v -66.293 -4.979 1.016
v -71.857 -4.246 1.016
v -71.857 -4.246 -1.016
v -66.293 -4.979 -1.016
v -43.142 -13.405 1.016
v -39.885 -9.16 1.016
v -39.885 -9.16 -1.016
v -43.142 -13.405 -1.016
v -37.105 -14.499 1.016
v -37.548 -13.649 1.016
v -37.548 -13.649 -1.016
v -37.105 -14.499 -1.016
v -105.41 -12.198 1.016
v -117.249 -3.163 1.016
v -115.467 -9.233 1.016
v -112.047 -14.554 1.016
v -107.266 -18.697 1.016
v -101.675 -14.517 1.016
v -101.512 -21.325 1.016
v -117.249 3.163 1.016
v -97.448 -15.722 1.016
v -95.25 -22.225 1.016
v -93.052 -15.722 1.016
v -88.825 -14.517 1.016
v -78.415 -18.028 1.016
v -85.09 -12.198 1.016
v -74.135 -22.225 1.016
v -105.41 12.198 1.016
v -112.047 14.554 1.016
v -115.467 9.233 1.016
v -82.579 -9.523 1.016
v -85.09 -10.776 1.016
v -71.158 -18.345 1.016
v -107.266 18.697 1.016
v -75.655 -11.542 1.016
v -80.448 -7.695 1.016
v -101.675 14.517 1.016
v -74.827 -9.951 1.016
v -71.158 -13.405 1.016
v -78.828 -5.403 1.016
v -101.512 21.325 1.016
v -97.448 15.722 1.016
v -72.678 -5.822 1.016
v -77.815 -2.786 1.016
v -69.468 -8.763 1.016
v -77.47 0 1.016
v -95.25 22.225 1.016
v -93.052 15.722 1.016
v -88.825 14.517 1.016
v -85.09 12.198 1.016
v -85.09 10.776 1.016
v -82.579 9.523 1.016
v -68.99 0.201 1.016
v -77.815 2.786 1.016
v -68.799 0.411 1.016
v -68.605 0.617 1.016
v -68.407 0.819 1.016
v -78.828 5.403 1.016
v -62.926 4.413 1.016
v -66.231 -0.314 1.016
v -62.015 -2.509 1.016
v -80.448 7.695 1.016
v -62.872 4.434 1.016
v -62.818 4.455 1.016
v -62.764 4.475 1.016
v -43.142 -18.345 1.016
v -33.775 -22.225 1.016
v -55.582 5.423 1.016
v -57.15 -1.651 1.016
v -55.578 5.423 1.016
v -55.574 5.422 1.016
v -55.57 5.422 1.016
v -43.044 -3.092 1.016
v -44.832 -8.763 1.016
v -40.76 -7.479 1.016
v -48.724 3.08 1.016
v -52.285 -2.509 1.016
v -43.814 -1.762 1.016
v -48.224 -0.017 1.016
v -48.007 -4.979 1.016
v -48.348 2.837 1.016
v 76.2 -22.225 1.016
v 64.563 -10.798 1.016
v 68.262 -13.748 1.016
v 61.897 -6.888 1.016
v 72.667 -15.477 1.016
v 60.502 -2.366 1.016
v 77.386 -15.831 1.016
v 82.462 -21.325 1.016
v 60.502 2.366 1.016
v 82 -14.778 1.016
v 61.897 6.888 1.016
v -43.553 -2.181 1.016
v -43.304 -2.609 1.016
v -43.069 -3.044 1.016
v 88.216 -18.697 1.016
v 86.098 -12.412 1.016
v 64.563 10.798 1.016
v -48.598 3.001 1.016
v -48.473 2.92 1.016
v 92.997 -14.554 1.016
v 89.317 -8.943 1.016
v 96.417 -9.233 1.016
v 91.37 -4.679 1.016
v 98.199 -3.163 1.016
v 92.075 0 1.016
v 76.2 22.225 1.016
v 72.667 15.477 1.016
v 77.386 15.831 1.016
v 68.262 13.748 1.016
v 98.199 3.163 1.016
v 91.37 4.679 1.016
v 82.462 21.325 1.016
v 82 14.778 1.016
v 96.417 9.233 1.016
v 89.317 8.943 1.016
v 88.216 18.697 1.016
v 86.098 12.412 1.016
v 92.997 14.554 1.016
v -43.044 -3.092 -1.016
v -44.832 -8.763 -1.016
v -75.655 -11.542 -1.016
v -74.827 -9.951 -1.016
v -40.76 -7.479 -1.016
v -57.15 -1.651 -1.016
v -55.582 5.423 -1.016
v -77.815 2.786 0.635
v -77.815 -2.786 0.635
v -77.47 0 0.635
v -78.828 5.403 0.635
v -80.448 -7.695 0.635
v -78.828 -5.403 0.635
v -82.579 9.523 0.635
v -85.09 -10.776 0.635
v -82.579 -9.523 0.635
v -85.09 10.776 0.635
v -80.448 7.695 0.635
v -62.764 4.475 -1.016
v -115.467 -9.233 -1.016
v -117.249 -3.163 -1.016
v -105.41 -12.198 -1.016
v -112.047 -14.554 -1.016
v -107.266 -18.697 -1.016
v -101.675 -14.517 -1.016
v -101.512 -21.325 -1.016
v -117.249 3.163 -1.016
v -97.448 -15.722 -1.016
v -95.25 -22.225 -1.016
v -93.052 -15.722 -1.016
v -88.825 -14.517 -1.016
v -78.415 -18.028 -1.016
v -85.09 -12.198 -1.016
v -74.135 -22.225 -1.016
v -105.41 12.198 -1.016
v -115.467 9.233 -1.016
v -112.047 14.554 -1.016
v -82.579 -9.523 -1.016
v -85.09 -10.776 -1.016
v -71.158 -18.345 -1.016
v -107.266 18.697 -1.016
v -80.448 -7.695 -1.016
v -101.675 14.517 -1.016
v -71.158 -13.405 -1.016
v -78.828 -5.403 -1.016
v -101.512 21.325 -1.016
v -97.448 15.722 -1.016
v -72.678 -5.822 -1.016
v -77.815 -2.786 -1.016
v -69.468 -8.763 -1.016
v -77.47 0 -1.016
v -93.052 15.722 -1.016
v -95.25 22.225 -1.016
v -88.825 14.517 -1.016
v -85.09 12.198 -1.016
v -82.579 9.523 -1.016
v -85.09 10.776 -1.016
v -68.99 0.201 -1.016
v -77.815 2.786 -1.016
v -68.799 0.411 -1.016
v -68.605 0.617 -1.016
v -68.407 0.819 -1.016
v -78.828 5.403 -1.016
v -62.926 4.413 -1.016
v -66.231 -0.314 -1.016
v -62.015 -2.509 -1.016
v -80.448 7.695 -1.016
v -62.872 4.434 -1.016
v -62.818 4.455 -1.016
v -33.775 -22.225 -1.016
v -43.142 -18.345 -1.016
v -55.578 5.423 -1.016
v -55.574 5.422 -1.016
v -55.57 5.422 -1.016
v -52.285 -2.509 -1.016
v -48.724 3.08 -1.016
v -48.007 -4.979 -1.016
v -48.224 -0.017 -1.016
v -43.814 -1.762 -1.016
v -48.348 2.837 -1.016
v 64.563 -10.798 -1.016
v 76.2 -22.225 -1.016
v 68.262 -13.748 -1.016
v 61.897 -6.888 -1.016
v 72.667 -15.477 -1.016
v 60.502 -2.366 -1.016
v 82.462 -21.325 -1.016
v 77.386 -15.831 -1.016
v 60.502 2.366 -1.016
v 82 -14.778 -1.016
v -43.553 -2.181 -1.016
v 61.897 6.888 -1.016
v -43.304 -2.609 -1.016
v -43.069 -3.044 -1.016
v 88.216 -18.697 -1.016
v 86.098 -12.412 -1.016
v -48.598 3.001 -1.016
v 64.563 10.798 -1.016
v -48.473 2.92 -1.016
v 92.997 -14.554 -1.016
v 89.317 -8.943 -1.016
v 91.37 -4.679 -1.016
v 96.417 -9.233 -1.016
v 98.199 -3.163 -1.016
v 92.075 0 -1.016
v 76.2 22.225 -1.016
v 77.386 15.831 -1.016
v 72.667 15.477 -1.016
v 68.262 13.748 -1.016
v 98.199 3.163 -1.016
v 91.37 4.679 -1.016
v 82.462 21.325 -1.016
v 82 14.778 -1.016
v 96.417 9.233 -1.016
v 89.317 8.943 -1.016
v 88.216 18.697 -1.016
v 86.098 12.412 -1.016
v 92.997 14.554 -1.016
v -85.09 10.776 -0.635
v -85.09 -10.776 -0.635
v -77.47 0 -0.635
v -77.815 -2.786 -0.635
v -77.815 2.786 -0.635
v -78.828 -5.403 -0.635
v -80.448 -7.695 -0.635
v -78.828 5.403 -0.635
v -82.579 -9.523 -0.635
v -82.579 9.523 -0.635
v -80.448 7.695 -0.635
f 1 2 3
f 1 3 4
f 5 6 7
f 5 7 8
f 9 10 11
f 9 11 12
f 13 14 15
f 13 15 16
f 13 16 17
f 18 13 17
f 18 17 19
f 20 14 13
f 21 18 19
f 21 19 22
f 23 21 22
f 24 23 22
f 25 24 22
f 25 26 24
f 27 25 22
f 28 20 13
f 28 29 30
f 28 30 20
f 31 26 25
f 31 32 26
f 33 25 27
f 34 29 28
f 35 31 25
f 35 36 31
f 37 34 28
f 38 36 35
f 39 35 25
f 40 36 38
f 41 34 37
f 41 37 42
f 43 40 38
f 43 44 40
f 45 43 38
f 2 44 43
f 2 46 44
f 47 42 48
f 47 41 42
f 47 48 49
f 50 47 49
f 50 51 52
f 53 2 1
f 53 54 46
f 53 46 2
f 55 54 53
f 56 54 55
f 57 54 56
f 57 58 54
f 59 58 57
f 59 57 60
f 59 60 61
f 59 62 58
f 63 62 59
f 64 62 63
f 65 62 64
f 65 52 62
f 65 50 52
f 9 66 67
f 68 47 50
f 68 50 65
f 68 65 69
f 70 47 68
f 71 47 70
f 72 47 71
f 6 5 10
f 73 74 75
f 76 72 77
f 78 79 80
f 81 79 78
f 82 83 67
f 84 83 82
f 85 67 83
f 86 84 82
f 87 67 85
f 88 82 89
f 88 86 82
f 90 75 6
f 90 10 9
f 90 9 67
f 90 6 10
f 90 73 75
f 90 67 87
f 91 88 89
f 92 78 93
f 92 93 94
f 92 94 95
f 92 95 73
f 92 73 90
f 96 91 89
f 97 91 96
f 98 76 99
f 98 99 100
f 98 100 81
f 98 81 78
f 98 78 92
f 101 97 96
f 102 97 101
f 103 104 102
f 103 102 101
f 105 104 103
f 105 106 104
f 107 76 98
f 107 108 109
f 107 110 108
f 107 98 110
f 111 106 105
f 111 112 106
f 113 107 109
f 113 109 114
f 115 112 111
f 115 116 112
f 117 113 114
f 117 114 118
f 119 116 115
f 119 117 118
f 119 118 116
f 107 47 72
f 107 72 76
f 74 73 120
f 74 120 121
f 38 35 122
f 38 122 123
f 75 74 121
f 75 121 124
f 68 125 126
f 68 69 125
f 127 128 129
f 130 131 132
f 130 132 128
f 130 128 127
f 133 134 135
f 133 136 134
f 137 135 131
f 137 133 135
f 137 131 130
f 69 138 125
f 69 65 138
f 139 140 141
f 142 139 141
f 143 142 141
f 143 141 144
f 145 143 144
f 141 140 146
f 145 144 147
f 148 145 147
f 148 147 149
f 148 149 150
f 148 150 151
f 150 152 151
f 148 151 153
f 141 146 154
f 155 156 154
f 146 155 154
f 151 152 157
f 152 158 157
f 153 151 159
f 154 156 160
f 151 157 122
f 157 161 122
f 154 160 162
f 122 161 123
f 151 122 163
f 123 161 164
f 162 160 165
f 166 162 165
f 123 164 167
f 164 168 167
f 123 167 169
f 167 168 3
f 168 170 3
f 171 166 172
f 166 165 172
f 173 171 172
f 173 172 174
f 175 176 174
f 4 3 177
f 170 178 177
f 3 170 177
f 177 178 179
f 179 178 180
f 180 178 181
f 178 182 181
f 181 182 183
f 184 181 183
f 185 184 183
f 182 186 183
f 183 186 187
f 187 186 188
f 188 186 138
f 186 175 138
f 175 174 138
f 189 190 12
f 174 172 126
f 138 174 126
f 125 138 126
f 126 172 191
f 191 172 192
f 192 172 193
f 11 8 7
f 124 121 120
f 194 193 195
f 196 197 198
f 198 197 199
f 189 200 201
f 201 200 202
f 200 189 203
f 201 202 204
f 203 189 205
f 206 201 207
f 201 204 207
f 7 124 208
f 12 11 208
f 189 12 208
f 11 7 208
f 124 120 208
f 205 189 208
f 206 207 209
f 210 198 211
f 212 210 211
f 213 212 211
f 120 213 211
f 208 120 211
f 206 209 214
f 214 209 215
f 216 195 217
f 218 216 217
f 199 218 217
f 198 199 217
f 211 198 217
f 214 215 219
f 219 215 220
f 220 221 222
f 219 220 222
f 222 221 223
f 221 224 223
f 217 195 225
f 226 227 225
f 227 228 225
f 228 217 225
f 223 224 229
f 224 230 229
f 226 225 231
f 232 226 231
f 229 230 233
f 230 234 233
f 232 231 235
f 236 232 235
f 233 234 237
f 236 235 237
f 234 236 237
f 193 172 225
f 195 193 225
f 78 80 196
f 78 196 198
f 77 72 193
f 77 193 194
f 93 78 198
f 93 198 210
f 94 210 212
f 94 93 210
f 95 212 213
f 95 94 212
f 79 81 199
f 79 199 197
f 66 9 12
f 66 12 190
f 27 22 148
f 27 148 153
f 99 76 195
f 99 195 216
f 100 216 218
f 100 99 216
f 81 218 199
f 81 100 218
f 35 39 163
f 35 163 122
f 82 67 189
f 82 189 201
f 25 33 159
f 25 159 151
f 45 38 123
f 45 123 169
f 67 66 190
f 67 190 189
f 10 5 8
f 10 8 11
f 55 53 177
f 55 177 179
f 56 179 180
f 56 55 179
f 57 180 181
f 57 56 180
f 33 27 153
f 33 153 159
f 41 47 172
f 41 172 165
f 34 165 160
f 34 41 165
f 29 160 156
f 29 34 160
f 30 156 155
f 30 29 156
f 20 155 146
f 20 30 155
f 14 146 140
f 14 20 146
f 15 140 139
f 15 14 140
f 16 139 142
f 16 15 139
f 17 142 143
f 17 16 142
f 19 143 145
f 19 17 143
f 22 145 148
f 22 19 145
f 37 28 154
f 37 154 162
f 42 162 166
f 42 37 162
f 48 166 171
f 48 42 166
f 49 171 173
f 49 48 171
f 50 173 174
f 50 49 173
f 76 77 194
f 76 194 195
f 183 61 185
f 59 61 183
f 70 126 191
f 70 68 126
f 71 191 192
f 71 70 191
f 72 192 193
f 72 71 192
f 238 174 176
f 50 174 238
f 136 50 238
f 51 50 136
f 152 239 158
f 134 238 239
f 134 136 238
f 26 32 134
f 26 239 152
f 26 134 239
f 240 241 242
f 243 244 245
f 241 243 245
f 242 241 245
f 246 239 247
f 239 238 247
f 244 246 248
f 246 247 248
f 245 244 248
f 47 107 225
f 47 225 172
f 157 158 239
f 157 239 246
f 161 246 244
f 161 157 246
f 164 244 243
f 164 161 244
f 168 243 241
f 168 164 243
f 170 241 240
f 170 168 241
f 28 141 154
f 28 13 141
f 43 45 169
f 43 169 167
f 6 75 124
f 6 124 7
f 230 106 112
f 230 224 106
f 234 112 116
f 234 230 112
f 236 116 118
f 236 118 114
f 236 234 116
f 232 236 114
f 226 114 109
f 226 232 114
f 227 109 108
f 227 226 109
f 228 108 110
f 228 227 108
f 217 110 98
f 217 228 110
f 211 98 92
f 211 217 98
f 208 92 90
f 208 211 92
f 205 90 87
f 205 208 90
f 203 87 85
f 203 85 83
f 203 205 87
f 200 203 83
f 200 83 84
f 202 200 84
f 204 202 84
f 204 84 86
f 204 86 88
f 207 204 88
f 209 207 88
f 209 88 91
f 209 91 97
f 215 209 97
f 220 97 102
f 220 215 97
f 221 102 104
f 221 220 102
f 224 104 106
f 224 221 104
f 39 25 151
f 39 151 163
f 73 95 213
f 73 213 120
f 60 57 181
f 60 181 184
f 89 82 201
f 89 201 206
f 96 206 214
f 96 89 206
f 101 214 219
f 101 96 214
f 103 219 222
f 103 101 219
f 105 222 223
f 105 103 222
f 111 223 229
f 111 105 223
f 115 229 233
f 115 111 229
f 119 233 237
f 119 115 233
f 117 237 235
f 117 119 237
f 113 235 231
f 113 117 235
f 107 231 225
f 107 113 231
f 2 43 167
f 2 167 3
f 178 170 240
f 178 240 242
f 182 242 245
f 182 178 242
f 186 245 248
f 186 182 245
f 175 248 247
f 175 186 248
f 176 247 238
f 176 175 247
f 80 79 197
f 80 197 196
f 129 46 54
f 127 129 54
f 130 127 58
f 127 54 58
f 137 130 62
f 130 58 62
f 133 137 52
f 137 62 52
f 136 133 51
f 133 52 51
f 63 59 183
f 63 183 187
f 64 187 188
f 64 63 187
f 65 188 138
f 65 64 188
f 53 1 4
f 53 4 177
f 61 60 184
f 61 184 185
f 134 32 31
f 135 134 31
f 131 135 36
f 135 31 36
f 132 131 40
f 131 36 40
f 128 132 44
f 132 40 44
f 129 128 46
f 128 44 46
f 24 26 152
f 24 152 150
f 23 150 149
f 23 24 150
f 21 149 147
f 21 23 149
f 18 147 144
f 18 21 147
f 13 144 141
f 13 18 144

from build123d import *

# Parameters (mm, degrees)
F0_R     = 15.875
F1_DEPTH = 1.016
F3_DEPTH = 0.381


# Not quite as in the source:
# - a pattern or mirror of a feature is missing from the dataset's text; its kind, count and spacing are read off the source's solid
# - a feature names something its author has since deleted; it is built from what else it names


with BuildPart() as f1:
    # F0 (on Top) → F1 (new body, symmetric)
    with BuildSketch(Plane.XY):
        with BuildLine():
            Line((76.2, 22.225), (-95.25, 22.225))
            ThreePointArc((-95.25, 22.225), (-117.475, 0), (-95.25, -22.225))
            Line((-95.25, -22.225), (-81.2163393225, -22.225))
            Line((-81.2163393225, -22.225), (-80.4999828905, -20.8488920975))
            Line((-80.4999828905, -20.8488920975), (-81.8859980281, -17.8765730428))
            Line((-81.8859980281, -17.8765730428), (-80.3221061469, -17.944854037))
            Line((-80.3221061469, -17.944854037), (-81.0788131138, -9.2956538274))
            Line((-81.0788131138, -9.2956538274), (-79.6325889287, -9.8946994991))
            Line((-79.6325889287, -9.8946994991), (-77.3854601863, -1.5083008612))
            Line((-77.3854601863, -1.5083008612), (-76.231339678, -2.5658574615))
            Line((-76.231339678, -2.5658574615), (-71.2514121167, 4.5462161589))
            Line((-71.2514121167, 4.5462161589), (-70.5285992516, 3.1577055639))
            Line((-70.5285992516, 3.1577055639), (-63.4165256312, 8.1376331253))
            Line((-63.4165256312, 8.1376331253), (-63.2122023083, 6.5856434055))
            Line((-63.2122023083, 6.5856434055), (-54.8258036704, 8.832772148))
            Line((-54.8258036704, 8.832772148), (-55.1646142981, 7.3044961686))
            Line((-55.1646142981, 7.3044961686), (-46.5154140885, 6.5477892017))
            Line((-46.5154140885, 6.5477892017), (-47.3564931047, 5.2275596009))
            Line((-47.3564931047, 5.2275596009), (-39.4877125173, 1.5582869527))
            Line((-39.4877125173, 1.5582869527), (-40.7296133796, 0.6053429047))
            Line((-40.7296133796, 0.6053429047), (-34.5903434842, -5.5339269908))
            Line((-34.5903434842, -5.5339269908), (-36.0832746201, -6.0046463698))
            Line((-36.0832746201, -6.0046463698), (-32.4140019719, -13.8734269572))
            Line((-32.4140019719, -13.8734269572), (-33.9778938531, -13.805145963))
            Line((-33.9778938531, -13.805145963), (-33.273088024, -21.8611134529))
            Line((-33.273088024, -21.8611134529), (-33.0836606775, -22.225))
            Line((-33.0836606775, -22.225), (76.2, -22.225))
            ThreePointArc((76.2, -22.225), (98.425, 0), (76.2, 22.225))
        make_face()
        with BuildLine():
            ThreePointArc((-105.41, 12.1979516723), (-95.25, 15.875), (-85.09, 12.1979516723))
            Line((-85.09, 12.1979516723), (-85.09, -12.1979516723))
            ThreePointArc((-85.09, -12.1979516723), (-95.25, -15.875), (-105.41, -12.1979516723))
            Line((-105.41, -12.1979516723), (-105.41, 12.1979516723))
        make_face(mode=Mode.SUBTRACT)
        with Locations((76.2, 0)):
            Circle(F0_R, mode=Mode.SUBTRACT)
        Polygon((-80.4999828905, -20.8488920975), (-81.2163393225, -22.225), (-79.8582932371, -22.225), align=None)
        Polygon((-33.2412520763, -22.225), (-33.0836606775, -22.225), (-33.273088024, -21.8611134529), align=None)
        Polygon((-80.4999828905, -20.8488920975), (-79.8582932371, -22.225), (-77.6369016412, -22.225), (-74.1351559236, -22.225), (-71.1579054788, -18.3449716791), (-78.4147248097, -18.0281321046), (-79.3376725148, -18.6161146398), align=None)
        Polygon((-81.8859980281, -17.8765730428), (-80.4999828905, -20.8488920975), (-79.3376725148, -18.6161146398), (-80.2145068425, -19.1747197137), (-80.3221061469, -17.944854037), align=None)
        Polygon((-33.7748775265, -22.225), (-33.2412520763, -22.225), (-33.273088024, -21.8611134529), (-37.1054537581, -14.4992073738), (-43.1420945212, -18.3449716791), align=None)
        Polygon((-37.1054537581, -14.4992073738), (-33.273088024, -21.8611134529), (-33.9778938531, -13.805145963), (-35.8852751903, -13.7218678954), align=None)
        Polygon((-79.0178794125, -18.001797806), (-79.3376725148, -18.6161146398), (-78.4147248097, -18.0281321046), align=None)
        Polygon((-80.2145068425, -19.1747197137), (-79.3376725148, -18.6161146398), (-79.0178794125, -18.001797806), (-80.3221061469, -17.944854037), align=None)
        Polygon((-35.8852751903, -13.7218678954), (-33.9778938531, -13.805145963), (-34.0854931575, -12.5752802863), align=None)
        Polygon((-34.0854931575, -12.5752802863), (-33.9778938531, -13.805145963), (-32.4140019719, -13.8734269572), (-36.0832746201, -6.0046463698), (-37.9041095643, -6.5787534225), (-39.8848289883, -9.1600772324), (-37.5478999587, -13.6492761303), (-35.8852751903, -13.7218678954), align=None)
        Polygon((-37.5478999587, -13.6492761303), (-37.1054537581, -14.4992073738), (-35.8852751903, -13.7218678954), align=None)
        Polygon((-81.0788131138, -9.2956538274), (-80.3221061469, -17.944854037), (-79.0178794125, -18.001797806), (-75.6552159218, -11.5421813412), (-77.8687195378, -10.6253181231), (-79.9521174914, -11.0871963296), (-79.6325889287, -9.8946994991), align=None)
        Polygon((-79.0178794125, -18.001797806), (-78.4147248097, -18.0281321046), (-71.1579054788, -13.4050283209), (-75.6552159218, -11.5421813412), align=None)
        Polygon((-43.1420945212, -13.4050283209), (-37.5478999587, -13.6492761303), (-39.8848289883, -9.1600772324), align=None)
        Polygon((-77.8687195378, -10.6253181231), (-75.6552159218, -11.5421813412), (-74.8268774652, -9.950957971), align=None)
        Polygon((-37.9041095643, -6.5787534225), (-36.0832746201, -6.0046463698), (-36.6050237274, -4.8857517984), align=None)
        Polygon((-36.6050237274, -4.8857517984), (-36.0832746201, -6.0046463698), (-34.5903434842, -5.5339269908), (-40.7296133796, 0.6053429047), (-42.2442823639, -0.5569034849), (-43.0436234519, -3.0920895249), (-40.7598556276, -7.4791666976), (-37.9041095643, -6.5787534225), align=None)
        Polygon((-40.7598556276, -7.4791666976), (-39.8848289883, -9.1600772324), (-37.9041095643, -6.5787534225), align=None)
        Polygon((-77.8687195378, -10.6253181231), (-79.6325889287, -9.8946994991), (-79.9521174914, -11.0871963296), align=None)
        Polygon((-77.3854601863, -1.5083008612), (-79.6325889287, -9.8946994991), (-77.8687195378, -10.6253181231), (-74.8268774652, -9.950957971), (-72.6776090009, -5.822251665), (-74.8237309138, -3.855693253), (-76.9394562474, -3.5771527286), (-76.231339678, -2.5658574615), align=None)
        Polygon((-72.6776090009, -5.822251665), (-74.8268774652, -9.950957971), (-69.4683453434, -8.763), align=None)
        Polygon((-44.8316546566, -8.763), (-40.7598556276, -7.4791666976), (-43.0436234519, -3.0920895249), align=None)
        Polygon((-74.8237309138, -3.855693253), (-72.6776090009, -5.822251665), (-71.8571921171, -4.2462454947), align=None)
        Polygon((-42.2442823639, -0.5569034849), (-40.7296133796, 0.6053429047), (-41.6025816474, 1.4783111724), align=None)
        with BuildLine():
            Line((-41.6025816474, 1.4783111724), (-40.7296133796, 0.6053429047))
            Line((-40.7296133796, 0.6053429047), (-39.4877125173, 1.5582869527))
            Line((-39.4877125173, 1.5582869527), (-47.3564931047, 5.2275596009))
            Line((-47.3564931047, 5.2275596009), (-48.3823046954, 3.617357942))
            Line((-48.3823046954, 3.617357942), (-48.348249672, 2.8373696699))
            ThreePointArc((-48.348249672, 2.8373696699), (-45.8449546627, 0.7708533195), (-43.8143326805, -1.7616454653))
            Line((-43.8143326805, -1.7616454653), (-42.2442823639, -0.5569034849))
            Line((-42.2442823639, -0.5569034849), (-41.6025816474, 1.4783111724))
        make_face()
        with BuildLine():
            Line((-43.0687030233, -3.0439121166), (-43.0436234519, -3.0920895249))
            Line((-43.0436234519, -3.0920895249), (-42.2442823639, -0.5569034849))
            Line((-42.2442823639, -0.5569034849), (-43.8143326805, -1.7616454653))
            ThreePointArc((-43.8143326805, -1.7616454653), (-43.4265334283, -2.3940654467), (-43.0687030233, -3.0439121166))
        make_face()
        Polygon((-74.8237309138, -3.855693253), (-76.231339678, -2.5658574615), (-76.9394562474, -3.5771527286), align=None)
        with BuildLine():
            Line((-71.2514121167, 4.5462161589), (-76.231339678, -2.5658574615))
            Line((-76.231339678, -2.5658574615), (-74.8237309138, -3.855693253))
            Line((-74.8237309138, -3.855693253), (-71.8571921171, -4.2462454947))
            Line((-71.8571921171, -4.2462454947), (-71.2312969767, -3.0439121166))
            ThreePointArc((-71.2312969767, -3.0439121166), (-70.2116133855, -1.3514289323), (-68.9895778341, 0.2012729279))
            Line((-68.9895778341, 0.2012729279), (-69.6470295052, 1.4642258374))
            Line((-69.6470295052, 1.4642258374), (-71.5398945187, 2.4495889946))
            Line((-71.5398945187, 2.4495889946), (-70.5285992516, 3.1577055639))
            Line((-70.5285992516, 3.1577055639), (-71.2514121167, 4.5462161589))
        make_face()
        with BuildLine():
            Line((-71.2312969767, -3.0439121166), (-71.8571921171, -4.2462454947))
            Line((-71.8571921171, -4.2462454947), (-66.2930109602, -4.9787838411))
            Line((-66.2930109602, -4.9787838411), (-68.9895778341, 0.2012729279))
            ThreePointArc((-68.9895778341, 0.2012729279), (-70.2116133855, -1.3514289323), (-71.2312969767, -3.0439121166))
        make_face()
        Polygon((-48.3823046954, 3.617357942), (-47.3564931047, 5.2275596009), (-48.4753876761, 5.7493087082), align=None)
        with BuildLine():
            Line((-48.4753876761, 5.7493087082), (-47.3564931047, 5.2275596009))
            Line((-47.3564931047, 5.2275596009), (-46.5154140885, 6.5477892017))
            Line((-46.5154140885, 6.5477892017), (-55.1646142981, 7.3044961686))
            Line((-55.1646142981, 7.3044961686), (-55.5778404781, 5.4405533245))
            Line((-55.5778404781, 5.4405533245), (-55.5701648333, 5.4220226787))
            ThreePointArc((-55.5701648333, 5.4220226787), (-52.0121003071, 4.6464015983), (-48.7243991788, 3.0803771655))
            Line((-48.7243991788, 3.0803771655), (-48.3823046954, 3.617357942))
            Line((-48.3823046954, 3.617357942), (-48.4753876761, 5.7493087082))
        make_face()
        with BuildLine():
            Line((-48.0069890398, -4.9787838411), (-43.8143326805, -1.7616454653))
            ThreePointArc((-43.8143326805, -1.7616454653), (-45.8449546627, 0.7708533195), (-48.348249672, 2.8373696699))
            Line((-48.348249672, 2.8373696699), (-48.2236044906, -0.017474342))
            Line((-48.2236044906, -0.017474342), (-48.0069890398, -4.9787838411))
        make_face()
        Polygon((-69.6470295052, 1.4642258374), (-70.5285992516, 3.1577055639), (-71.5398945187, 2.4495889946), align=None)
        with BuildLine():
            Line((-63.4165256312, 8.1376331253), (-70.5285992516, 3.1577055639))
            Line((-70.5285992516, 3.1577055639), (-69.6470295052, 1.4642258374))
            Line((-69.6470295052, 1.4642258374), (-68.4074402589, 0.8189365196))
            ThreePointArc((-68.4074402589, 0.8189365196), (-65.8542771411, 2.9017913046), (-62.9261305575, 4.4127127279))
            Line((-62.9261305575, 4.4127127279), (-62.9630019017, 4.6927783921))
            Line((-62.9630019017, 4.6927783921), (-64.4046991388, 6.2661148428))
            Line((-64.4046991388, 6.2661148428), (-63.2122023083, 6.5856434055))
            Line((-63.2122023083, 6.5856434055), (-63.4165256312, 8.1376331253))
        make_face()
        with BuildLine():
            Line((-69.6470295052, 1.4642258374), (-68.9895778341, 0.2012729279))
            ThreePointArc((-68.9895778341, 0.2012729279), (-68.7026377194, 0.5139959287), (-68.4074402589, 0.8189365196))
            Line((-68.4074402589, 0.8189365196), (-69.6470295052, 1.4642258374))
        make_face()
        with BuildLine():
            Line((-48.348249672, 2.8373696699), (-48.3823046954, 3.617357942))
            Line((-48.3823046954, 3.617357942), (-48.7243991788, 3.0803771655))
            ThreePointArc((-48.7243991788, 3.0803771655), (-48.5354675075, 2.9601998346), (-48.348249672, 2.8373696699))
        make_face()
        with BuildLine():
            ThreePointArc((-62.9261305575, 4.4127127279), (-65.8542771411, 2.9017913046), (-68.4074402589, 0.8189365196))
            Line((-68.4074402589, 0.8189365196), (-66.2308278804, -0.3141361665))
            Line((-66.2308278804, -0.3141361665), (-62.0148945187, -2.5088121619))
            Line((-62.0148945187, -2.5088121619), (-62.9261305575, 4.4127127279))
        make_face()
        with BuildLine():
            Line((-56.3944799748, 7.412095473), (-55.1646142981, 7.3044961686))
            Line((-55.1646142981, 7.3044961686), (-54.8258036704, 8.832772148))
            Line((-54.8258036704, 8.832772148), (-63.2122023083, 6.5856434055))
            Line((-63.2122023083, 6.5856434055), (-62.9630019017, 4.6927783921))
            Line((-62.9630019017, 4.6927783921), (-62.7636045656, 4.4751743841))
            ThreePointArc((-62.7636045656, 4.4751743841), (-59.2274466598, 5.3643114334), (-55.5816939364, 5.4231714974))
            Line((-55.5816939364, 5.4231714974), (-55.5778404781, 5.4405533245))
            Line((-55.5778404781, 5.4405533245), (-56.3944799748, 7.412095473))
        make_face()
        Polygon((-55.5778404781, 5.4405533245), (-55.1646142981, 7.3044961686), (-56.3944799748, 7.412095473), align=None)
        with BuildLine():
            Line((-52.2851054813, -2.5088121619), (-48.7243991788, 3.0803771655))
            ThreePointArc((-48.7243991788, 3.0803771655), (-52.0121003071, 4.6464015983), (-55.5701648333, 5.4220226787))
            Line((-55.5701648333, 5.4220226787), (-52.2851054813, -2.5088121619))
        make_face()
        Polygon((-62.9630019017, 4.6927783921), (-63.2122023083, 6.5856434055), (-64.4046991388, 6.2661148428), align=None)
        with BuildLine():
            Line((-62.9630019017, 4.6927783921), (-62.9261305575, 4.4127127279))
            ThreePointArc((-62.9261305575, 4.4127127279), (-62.8449531963, 4.4441663787), (-62.7636045656, 4.4751743841))
            Line((-62.7636045656, 4.4751743841), (-62.9630019017, 4.6927783921))
        make_face()
        with BuildLine():
            Line((-55.5701648333, 5.4220226787), (-55.5778404781, 5.4405533245))
            Line((-55.5778404781, 5.4405533245), (-55.5816939364, 5.4231714974))
            ThreePointArc((-55.5816939364, 5.4231714974), (-55.57592928, 5.4225981398), (-55.5701648333, 5.4220226787))
        make_face()
        with BuildLine():
            ThreePointArc((-55.5816939364, 5.4231714974), (-59.2274466598, 5.3643114334), (-62.7636045656, 4.4751743841))
            Line((-62.7636045656, 4.4751743841), (-57.15, -1.651))
            Line((-57.15, -1.651), (-55.5816939364, 5.4231714974))
        make_face()
    extrude(amount=F1_DEPTH, both=True)

    # F2 (on face) → F3 (cut)
    with BuildSketch(Plane.XY.offset(1.016)):
        with BuildLine():
            ThreePointArc((-85.09, -10.7763073453), (-79.56744408, -6.5991135768), (-77.47, 0))
            ThreePointArc((-77.47, 0), (-79.56744408, 6.5991135768), (-85.09, 10.7763073453))
            Line((-85.09, 10.7763073453), (-85.09, -10.7763073453))
        make_face()
    f3 = extrude(amount=-F3_DEPTH, mode=Mode.SUBTRACT)

    # F3_copies: F3 across plane
    add(f3.mirror(Plane(origin=(0, 0, 0), x_dir=(-1, 0, 0), z_dir=(0, 0, -1))), mode=Mode.SUBTRACT)


solid = f1.part
